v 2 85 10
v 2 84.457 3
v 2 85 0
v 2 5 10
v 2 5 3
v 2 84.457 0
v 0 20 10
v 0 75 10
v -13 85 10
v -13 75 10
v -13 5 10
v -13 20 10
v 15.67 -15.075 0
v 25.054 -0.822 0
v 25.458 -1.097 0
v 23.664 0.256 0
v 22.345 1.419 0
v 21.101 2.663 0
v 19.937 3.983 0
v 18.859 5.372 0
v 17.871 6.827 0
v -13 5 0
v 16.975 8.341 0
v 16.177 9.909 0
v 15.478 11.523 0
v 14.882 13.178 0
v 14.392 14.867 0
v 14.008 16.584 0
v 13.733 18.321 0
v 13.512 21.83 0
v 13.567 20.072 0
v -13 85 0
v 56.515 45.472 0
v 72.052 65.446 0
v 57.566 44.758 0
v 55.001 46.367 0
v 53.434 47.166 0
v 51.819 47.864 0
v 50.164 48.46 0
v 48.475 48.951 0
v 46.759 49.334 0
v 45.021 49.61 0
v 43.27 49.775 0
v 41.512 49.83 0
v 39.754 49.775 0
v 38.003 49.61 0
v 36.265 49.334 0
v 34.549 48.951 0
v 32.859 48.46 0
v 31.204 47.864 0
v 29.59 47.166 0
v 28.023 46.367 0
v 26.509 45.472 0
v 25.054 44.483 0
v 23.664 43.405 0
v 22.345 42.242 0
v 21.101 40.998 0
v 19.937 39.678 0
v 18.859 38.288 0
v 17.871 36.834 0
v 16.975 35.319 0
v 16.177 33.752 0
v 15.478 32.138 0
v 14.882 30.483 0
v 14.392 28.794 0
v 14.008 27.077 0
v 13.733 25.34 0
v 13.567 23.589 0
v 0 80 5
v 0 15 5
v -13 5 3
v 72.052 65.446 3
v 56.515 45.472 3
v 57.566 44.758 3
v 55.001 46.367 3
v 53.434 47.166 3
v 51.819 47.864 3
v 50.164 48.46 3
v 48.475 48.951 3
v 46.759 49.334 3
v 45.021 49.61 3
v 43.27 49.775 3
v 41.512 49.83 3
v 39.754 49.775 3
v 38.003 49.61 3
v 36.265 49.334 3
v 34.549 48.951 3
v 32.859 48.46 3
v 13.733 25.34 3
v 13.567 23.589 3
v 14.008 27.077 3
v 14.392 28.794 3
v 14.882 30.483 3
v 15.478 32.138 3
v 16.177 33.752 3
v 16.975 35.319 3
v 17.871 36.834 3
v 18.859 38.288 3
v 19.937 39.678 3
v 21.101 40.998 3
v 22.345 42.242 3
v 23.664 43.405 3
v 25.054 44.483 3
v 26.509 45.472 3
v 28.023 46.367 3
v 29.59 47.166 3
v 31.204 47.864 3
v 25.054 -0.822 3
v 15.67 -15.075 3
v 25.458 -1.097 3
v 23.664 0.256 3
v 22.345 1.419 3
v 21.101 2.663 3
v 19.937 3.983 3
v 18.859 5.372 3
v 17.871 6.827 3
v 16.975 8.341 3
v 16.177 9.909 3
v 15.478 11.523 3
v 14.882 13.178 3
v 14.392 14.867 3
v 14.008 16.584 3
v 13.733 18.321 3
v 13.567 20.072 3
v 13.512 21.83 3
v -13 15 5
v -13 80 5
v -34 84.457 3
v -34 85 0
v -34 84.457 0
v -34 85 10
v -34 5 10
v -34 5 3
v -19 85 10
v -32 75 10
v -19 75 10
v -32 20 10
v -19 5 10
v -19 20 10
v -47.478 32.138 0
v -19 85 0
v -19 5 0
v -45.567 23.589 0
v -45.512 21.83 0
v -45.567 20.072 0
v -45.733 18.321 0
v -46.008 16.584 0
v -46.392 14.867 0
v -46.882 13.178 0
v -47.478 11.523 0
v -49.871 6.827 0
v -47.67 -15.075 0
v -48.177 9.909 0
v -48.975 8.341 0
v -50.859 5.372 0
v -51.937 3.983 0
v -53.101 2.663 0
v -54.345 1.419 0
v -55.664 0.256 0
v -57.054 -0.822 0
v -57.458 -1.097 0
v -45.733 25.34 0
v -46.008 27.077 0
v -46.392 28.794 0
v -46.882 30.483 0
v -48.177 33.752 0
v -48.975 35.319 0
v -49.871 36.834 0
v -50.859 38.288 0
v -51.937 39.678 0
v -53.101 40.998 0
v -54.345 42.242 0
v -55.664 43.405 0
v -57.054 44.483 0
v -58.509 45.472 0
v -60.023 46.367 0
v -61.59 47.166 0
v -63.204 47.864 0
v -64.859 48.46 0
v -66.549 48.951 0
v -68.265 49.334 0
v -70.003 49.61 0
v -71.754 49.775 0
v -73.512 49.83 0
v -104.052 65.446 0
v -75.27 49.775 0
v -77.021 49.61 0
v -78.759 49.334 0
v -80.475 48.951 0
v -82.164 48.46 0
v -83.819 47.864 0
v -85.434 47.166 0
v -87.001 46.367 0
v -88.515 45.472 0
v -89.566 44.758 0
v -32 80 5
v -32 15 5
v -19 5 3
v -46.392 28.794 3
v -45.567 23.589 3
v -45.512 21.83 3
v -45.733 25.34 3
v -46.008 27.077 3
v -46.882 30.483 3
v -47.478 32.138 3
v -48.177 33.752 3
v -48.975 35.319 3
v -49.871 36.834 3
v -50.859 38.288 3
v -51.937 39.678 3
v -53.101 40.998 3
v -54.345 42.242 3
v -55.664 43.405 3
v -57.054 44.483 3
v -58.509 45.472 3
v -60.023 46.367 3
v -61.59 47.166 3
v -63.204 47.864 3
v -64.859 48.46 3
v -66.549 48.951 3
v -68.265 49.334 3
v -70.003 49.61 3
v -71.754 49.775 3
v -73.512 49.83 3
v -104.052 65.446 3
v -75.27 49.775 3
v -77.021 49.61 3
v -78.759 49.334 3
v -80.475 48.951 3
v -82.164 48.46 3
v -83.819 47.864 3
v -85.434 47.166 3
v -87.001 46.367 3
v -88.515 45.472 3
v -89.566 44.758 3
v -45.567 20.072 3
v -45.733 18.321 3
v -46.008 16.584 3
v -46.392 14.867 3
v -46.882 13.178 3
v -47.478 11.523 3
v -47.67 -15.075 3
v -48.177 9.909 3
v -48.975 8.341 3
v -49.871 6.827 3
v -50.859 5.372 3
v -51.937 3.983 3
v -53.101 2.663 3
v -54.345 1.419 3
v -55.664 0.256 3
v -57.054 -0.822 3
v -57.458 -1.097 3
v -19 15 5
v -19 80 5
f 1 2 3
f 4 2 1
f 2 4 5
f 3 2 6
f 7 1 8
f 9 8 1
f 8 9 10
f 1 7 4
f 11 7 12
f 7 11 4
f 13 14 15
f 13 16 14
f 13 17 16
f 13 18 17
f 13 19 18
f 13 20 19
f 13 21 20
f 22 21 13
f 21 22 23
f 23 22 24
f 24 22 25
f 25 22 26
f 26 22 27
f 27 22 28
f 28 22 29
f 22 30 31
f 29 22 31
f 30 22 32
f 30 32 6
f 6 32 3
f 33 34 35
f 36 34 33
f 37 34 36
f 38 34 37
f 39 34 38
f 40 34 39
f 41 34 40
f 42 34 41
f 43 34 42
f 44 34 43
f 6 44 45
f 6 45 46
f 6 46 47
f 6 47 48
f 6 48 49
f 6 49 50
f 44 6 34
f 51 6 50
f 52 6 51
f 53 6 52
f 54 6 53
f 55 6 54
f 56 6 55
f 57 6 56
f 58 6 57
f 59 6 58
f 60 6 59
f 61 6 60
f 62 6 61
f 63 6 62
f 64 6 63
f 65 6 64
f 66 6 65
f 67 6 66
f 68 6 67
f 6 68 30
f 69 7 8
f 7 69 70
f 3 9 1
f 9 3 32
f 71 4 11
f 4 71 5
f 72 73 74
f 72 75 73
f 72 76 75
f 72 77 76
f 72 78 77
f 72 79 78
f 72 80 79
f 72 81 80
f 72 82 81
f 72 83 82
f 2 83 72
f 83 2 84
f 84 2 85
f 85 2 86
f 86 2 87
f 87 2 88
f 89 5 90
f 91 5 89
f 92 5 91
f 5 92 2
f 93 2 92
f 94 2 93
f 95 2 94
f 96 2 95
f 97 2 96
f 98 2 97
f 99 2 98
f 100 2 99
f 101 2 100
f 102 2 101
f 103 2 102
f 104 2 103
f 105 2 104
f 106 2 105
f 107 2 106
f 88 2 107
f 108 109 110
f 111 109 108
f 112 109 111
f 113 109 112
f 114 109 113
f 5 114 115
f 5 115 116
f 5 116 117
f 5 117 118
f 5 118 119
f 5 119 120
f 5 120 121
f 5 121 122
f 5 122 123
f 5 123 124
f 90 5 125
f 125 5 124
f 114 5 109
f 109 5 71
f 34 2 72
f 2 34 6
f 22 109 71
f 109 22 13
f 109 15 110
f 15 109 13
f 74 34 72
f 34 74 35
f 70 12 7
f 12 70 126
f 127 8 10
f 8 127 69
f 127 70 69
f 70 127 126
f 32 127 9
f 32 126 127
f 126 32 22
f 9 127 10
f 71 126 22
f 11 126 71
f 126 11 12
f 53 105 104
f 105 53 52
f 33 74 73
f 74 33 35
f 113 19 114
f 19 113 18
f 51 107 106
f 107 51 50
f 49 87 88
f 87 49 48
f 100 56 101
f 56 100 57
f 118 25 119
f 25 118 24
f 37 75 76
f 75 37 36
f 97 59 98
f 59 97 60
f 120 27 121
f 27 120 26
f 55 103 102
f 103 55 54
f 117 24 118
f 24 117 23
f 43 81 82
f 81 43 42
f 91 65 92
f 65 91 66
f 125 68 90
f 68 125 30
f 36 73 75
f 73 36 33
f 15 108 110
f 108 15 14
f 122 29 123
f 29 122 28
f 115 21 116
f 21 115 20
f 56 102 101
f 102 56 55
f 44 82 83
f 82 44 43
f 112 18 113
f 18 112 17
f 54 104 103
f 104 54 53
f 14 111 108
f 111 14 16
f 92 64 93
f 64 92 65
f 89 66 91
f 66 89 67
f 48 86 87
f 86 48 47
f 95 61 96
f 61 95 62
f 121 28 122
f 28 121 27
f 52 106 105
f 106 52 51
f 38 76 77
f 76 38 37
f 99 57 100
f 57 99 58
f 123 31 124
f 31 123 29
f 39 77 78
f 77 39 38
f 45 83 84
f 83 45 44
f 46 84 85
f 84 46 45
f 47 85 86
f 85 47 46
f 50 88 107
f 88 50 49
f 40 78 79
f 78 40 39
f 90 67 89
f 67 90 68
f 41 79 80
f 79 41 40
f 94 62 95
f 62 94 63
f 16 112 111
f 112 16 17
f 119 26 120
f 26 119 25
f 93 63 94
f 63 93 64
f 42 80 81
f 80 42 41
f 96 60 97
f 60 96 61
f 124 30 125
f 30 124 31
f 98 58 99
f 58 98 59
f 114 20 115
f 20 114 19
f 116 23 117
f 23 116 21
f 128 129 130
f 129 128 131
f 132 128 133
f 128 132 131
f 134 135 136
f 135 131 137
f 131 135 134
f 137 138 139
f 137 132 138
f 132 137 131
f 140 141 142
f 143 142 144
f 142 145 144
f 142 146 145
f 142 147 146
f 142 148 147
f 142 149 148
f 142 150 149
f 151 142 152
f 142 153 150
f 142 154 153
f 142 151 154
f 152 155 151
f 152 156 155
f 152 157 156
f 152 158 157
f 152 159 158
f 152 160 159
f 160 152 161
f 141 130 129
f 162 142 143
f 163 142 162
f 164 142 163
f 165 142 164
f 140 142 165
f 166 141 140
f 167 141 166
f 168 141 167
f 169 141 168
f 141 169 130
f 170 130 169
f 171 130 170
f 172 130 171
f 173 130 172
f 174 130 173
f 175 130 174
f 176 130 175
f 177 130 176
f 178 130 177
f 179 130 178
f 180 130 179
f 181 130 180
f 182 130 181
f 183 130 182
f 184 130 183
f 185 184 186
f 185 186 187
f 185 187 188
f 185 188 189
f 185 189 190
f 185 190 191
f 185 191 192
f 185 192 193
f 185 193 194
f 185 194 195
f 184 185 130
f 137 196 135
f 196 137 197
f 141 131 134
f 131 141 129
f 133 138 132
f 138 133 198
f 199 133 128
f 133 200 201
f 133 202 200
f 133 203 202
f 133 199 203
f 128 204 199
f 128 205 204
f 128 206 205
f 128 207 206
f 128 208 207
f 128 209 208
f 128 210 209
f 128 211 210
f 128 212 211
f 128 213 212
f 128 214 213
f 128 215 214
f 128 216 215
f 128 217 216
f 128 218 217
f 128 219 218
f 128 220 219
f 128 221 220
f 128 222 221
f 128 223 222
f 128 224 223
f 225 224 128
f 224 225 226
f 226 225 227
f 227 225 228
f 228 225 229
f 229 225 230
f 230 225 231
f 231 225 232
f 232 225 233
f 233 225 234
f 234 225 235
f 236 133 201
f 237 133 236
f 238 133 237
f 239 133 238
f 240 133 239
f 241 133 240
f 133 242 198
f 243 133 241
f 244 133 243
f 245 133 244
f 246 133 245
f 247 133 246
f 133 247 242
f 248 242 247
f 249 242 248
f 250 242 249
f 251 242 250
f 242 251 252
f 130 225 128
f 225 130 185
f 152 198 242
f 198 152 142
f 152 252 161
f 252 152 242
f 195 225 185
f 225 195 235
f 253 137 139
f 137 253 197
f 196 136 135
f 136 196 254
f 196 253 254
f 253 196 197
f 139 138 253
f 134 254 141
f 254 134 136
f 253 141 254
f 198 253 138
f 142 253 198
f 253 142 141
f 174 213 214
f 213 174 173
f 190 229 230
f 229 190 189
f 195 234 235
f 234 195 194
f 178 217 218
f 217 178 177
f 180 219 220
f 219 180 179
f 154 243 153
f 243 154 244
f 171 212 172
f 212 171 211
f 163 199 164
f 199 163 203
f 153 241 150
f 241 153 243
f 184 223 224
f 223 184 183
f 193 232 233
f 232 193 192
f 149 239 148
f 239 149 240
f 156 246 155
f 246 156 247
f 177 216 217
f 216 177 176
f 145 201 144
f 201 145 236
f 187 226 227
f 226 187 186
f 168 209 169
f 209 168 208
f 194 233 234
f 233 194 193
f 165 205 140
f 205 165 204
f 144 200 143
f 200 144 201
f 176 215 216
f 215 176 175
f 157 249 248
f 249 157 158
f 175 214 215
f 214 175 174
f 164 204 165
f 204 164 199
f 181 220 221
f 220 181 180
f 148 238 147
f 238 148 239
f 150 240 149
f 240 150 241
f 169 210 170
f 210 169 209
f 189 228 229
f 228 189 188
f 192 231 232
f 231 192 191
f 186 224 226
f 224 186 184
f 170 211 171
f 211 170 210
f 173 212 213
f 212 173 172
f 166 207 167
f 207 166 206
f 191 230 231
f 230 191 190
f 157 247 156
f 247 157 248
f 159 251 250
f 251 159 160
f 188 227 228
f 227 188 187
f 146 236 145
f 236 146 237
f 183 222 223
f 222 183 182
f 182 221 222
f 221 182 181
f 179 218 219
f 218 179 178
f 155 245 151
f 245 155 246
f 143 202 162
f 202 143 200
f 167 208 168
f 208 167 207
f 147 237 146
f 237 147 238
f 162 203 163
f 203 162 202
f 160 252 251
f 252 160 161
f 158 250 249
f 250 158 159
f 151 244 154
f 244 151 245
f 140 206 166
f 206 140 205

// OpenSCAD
L=95;
$fn=100;
r = 4;
D=13;
h=35;
a=35;
f=3;
encoche=5;
zz = 25;
c = 20;
d = 5;
butee = 2;
points1 = [[-D,encoche,0],
           [-D+h*cos(a),encoche-h*sin(a),0],
           [-D+h*cos(a)+(L+zz)*sin(a)*cos(a),encoche-h*sin(a)+(L+zz)*cos(a)*cos(a),0],
		   [0,L-2*encoche,0],
           [-D,encoche,f],
		   [-D+h*cos(a),encoche-h*sin(a),f],
           [-D+h*cos(a)+(L+zz)*sin(a)*cos(a),encoche-h*sin(a)+(L+zz)*cos(a)*cos(a),f],
		   [0,L-2*encoche,f]];
faces1 = [[0,1,2,3],[7,6,5,4],
          [0,4,5,1],[1,5,6,2],
          [2,6,7,3],[3,7,4,0]];
				
points2 = [[0,c,0],[-5,c-d,0],[-5,L-c+d,0],[0,L-c,0],
           [0,c,D],[-5,c-d,D],[-5,L-c+d,D],[0,L-c,D],
           [0,5,0],[-10,5,0],[-10,L-10,0],[0,L-10,0],
           [0,5,D],[-10,5,D],[-10,L-10,D],[0,L-10,D]];  
faces2 = [[4,0,8,12],[12,8,9,13],[9,10,14,13],[10,11,15,14],
		  [11,3,7,15],[5,1,0,4],[3,2,6,7], [1,5,6,2],
          [8,0,1,2,3,11,10,9],[5,4,12,13,14,15,7,6]];

cylinder_pos = [-D+h*cos(a)+(L+15)/2*sin(a)*cos(a),5-h*sin(a)+(L+15)/2*cos(a)*cos(a),-0.5];

difference() {
	union() {
		translate([0,5,0]) cube([butee,L-15,2*d]);
		polyhedron(points1,faces1);
        translate([0,0,10]) rotate([0,270,0]) 
        polyhedron(points2, faces2);
	};
	translate(cylinder_pos) cylinder(r=h*0.8,h=f+1);
}

translate([-32,0,0]) mirror(0,0,1) difference() {
	union() {
		translate([0,5,0]) cube([2,L-15,2*d]);
		polyhedron(points1,faces1);
        translate([0,0,10]) rotate([0,270,0]) 
        polyhedron(points2, faces2);
	};
	translate(cylinder_pos) cylinder(r=h*0.8,h=f+1);
}
